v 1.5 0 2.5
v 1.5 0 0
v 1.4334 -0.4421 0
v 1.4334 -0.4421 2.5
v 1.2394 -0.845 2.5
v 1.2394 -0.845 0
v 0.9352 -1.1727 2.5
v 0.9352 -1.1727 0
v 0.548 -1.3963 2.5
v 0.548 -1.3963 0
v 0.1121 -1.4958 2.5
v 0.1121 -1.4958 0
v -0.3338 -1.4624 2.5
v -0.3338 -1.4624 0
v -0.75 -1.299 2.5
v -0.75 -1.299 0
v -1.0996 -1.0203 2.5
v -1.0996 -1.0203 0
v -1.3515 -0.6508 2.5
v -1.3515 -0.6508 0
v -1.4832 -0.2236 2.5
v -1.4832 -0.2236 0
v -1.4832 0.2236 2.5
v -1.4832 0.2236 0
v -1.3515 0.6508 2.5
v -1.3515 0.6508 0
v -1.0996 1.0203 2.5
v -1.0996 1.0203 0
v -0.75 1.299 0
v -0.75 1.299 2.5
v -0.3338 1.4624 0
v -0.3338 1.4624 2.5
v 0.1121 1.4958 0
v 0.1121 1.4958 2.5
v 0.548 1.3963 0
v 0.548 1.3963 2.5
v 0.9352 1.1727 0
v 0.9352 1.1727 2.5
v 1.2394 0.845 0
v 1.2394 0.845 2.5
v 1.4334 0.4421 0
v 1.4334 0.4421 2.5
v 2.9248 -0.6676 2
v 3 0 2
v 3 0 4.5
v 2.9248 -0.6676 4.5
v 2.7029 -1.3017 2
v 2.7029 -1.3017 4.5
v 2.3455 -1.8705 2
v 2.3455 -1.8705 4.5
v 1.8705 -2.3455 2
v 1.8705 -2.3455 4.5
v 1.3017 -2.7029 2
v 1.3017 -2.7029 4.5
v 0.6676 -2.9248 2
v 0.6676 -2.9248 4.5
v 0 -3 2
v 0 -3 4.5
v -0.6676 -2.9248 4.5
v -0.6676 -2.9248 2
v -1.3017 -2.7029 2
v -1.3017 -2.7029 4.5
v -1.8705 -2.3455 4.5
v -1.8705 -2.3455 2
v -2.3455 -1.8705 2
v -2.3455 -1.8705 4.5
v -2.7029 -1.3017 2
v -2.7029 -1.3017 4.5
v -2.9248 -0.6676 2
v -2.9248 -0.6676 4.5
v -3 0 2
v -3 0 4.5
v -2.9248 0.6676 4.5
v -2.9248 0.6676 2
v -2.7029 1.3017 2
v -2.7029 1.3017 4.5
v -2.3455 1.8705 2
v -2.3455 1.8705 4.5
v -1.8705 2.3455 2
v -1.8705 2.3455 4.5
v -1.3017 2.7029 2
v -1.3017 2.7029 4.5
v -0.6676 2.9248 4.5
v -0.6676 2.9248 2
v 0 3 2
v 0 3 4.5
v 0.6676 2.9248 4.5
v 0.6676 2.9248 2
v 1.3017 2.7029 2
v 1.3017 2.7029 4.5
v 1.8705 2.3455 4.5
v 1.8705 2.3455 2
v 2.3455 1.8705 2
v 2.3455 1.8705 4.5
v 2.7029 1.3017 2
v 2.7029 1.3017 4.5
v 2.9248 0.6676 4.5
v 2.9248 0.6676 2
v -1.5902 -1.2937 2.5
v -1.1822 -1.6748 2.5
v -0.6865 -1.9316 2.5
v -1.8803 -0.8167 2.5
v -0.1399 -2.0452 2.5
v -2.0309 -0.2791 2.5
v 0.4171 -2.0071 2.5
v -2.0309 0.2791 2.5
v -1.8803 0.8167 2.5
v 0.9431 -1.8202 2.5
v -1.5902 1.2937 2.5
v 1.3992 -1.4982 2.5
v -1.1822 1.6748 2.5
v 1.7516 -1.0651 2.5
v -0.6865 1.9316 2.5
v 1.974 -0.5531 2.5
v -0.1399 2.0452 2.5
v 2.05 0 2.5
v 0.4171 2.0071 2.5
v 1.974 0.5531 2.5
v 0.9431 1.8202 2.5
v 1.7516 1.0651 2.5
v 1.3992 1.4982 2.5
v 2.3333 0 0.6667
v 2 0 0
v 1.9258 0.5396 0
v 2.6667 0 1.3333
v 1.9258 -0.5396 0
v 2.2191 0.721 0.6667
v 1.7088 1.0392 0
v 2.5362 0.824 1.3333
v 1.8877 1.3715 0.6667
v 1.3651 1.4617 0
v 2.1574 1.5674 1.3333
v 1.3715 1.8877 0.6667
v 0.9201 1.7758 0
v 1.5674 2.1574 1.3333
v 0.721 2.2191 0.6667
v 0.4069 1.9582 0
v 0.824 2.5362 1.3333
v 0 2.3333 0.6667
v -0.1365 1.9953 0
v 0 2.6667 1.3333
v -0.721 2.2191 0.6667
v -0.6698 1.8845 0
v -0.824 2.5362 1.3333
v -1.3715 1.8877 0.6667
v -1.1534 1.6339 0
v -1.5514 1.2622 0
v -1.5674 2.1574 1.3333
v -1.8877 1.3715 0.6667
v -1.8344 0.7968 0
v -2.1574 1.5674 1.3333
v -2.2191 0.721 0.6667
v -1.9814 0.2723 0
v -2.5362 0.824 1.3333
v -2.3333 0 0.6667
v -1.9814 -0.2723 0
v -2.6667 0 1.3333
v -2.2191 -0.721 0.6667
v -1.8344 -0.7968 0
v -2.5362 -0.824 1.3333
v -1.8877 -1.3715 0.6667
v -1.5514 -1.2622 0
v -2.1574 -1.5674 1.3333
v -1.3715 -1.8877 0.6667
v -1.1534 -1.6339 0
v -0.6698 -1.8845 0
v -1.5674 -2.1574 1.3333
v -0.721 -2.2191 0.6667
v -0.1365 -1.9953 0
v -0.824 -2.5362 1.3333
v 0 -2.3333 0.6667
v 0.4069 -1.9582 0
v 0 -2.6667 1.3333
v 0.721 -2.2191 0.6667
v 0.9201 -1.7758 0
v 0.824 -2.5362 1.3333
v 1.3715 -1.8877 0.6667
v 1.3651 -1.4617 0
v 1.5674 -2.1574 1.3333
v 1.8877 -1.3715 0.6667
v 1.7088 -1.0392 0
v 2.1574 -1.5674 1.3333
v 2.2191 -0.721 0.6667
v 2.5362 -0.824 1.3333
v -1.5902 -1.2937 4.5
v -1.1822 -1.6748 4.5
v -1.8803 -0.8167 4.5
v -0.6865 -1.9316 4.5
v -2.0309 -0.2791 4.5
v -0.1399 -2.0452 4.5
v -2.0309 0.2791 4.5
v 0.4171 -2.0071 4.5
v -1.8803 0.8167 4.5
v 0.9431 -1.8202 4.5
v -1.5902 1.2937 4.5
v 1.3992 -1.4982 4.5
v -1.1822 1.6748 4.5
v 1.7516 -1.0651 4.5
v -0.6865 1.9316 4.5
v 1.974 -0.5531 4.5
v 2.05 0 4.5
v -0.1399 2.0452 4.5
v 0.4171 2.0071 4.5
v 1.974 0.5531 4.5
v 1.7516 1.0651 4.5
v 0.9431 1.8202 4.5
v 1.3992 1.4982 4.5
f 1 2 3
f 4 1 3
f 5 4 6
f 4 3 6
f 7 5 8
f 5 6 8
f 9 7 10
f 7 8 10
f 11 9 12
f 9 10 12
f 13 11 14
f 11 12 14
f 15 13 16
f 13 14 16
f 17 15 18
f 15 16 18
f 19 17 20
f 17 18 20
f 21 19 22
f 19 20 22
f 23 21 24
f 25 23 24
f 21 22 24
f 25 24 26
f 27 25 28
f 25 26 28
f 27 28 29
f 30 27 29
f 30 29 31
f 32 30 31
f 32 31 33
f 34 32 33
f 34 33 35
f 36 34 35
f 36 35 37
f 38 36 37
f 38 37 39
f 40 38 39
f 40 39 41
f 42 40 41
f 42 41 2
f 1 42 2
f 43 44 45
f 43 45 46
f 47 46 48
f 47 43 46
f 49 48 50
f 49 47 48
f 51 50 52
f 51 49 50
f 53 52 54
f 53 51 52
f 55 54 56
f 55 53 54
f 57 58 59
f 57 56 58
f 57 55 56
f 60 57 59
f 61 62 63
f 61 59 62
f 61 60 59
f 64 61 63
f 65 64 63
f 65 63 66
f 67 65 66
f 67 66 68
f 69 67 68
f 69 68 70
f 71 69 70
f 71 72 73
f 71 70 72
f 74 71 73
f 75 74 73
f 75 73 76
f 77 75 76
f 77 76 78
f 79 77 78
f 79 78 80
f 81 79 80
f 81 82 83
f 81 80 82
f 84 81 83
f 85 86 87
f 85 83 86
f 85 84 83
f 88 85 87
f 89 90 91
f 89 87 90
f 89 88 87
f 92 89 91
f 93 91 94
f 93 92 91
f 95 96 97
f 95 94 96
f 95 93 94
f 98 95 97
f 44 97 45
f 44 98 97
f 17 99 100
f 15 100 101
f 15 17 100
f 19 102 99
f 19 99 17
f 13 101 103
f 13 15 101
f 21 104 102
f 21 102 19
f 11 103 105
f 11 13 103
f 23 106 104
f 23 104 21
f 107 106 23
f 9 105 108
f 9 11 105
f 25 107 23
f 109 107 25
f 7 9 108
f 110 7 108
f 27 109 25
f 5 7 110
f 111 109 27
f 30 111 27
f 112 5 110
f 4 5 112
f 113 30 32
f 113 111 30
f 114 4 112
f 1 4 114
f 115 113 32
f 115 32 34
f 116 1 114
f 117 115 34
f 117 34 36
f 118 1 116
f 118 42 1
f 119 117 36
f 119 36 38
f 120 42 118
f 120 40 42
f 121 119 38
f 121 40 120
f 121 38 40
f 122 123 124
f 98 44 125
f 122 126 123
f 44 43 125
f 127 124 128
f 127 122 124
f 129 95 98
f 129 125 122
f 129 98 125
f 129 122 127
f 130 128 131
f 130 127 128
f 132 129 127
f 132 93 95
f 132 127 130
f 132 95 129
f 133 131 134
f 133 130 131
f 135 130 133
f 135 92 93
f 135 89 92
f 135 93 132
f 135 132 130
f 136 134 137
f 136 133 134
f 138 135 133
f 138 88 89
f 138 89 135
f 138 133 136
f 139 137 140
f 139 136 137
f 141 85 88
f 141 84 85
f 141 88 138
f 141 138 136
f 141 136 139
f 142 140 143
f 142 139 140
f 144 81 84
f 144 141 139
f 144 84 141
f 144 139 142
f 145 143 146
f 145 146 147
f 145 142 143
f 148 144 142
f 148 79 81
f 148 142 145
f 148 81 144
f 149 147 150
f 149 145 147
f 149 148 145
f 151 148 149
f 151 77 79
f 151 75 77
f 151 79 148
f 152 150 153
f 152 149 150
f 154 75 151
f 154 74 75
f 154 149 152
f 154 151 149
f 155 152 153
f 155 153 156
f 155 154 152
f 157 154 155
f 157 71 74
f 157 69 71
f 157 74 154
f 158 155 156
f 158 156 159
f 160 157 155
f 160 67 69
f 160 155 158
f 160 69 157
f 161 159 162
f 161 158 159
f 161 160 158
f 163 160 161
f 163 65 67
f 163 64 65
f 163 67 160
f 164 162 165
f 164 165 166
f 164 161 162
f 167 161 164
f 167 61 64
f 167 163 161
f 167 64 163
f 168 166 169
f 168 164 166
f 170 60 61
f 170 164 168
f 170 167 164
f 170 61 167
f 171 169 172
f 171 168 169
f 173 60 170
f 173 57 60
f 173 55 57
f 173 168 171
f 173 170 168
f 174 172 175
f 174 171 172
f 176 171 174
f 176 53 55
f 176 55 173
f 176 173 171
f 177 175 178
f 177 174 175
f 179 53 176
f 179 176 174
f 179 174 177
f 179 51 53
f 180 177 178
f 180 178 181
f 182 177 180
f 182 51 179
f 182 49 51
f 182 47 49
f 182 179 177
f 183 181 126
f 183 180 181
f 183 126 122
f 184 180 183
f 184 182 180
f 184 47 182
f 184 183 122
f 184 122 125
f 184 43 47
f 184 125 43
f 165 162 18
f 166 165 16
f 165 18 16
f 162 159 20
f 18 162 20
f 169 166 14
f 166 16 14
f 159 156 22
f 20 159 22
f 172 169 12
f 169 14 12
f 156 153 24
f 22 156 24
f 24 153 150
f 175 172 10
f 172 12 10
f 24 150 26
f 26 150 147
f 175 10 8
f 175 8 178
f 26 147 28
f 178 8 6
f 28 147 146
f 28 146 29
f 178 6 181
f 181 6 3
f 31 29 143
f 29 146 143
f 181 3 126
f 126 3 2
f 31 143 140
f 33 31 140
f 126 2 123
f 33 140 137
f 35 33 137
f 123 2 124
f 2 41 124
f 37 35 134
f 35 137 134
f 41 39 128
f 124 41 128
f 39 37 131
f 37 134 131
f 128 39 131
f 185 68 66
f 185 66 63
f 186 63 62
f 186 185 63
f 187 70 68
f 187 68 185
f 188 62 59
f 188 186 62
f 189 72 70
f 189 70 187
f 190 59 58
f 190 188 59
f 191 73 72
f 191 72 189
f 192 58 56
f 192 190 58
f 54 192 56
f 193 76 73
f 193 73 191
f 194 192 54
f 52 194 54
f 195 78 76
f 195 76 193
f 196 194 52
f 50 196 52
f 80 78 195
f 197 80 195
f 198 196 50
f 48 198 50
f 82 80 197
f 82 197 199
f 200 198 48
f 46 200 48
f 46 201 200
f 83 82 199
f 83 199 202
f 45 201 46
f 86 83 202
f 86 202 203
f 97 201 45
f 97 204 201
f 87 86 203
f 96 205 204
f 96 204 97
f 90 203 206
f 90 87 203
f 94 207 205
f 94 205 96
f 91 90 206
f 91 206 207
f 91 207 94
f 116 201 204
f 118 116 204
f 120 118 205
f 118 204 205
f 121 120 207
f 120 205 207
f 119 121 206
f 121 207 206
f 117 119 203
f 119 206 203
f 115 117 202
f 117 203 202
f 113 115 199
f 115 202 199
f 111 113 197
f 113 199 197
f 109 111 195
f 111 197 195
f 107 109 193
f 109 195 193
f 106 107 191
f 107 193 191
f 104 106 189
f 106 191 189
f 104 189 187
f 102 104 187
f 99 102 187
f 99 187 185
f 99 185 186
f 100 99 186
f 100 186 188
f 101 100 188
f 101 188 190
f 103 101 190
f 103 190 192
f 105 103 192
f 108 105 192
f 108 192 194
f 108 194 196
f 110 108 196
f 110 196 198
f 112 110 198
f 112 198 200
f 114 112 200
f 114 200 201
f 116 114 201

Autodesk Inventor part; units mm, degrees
ref_plane "YZ Plane" through (0, 0, 0) normal (1, 0, 0) x (0, 1, 0)
ref_plane "XZ Plane" through (0, 0, 0) normal (0, 1, 0) x (-1, 0, 0)
ref_plane "XY Plane" through (0, 0, 0) normal (0, 0, 1) x (1, 0, 0)
sketch "スケッチ1" plane through (0, 0, 0) normal (0, 0, 1) x (1, 0, 0)
  circle A0 centre (0, 0) radius 3
  circle A1 centre (0, 0) radius 1.5
  dimension "d0" = 6
  dimension "d1" = 3
extrude "押し出し1" add sketch "スケッチ1" along normal blind 4.5
chamfer "面取り1" distance 2 distance2 1 1 edges at (-3, 0, 0) measured on face at (2.9903, -0.2414, 3)
sketch "スケッチ6" plane through (0, 0, 4.5) normal (0, 0, 1) x (1, 0, 0)
  circle A0 centre (0, 0) radius 2.05
  dimension "d23" = 4.1
extrude "押し出し4" cut sketch "スケッチ6" against normal blind 2
properties part number "Magnet_Simple"
